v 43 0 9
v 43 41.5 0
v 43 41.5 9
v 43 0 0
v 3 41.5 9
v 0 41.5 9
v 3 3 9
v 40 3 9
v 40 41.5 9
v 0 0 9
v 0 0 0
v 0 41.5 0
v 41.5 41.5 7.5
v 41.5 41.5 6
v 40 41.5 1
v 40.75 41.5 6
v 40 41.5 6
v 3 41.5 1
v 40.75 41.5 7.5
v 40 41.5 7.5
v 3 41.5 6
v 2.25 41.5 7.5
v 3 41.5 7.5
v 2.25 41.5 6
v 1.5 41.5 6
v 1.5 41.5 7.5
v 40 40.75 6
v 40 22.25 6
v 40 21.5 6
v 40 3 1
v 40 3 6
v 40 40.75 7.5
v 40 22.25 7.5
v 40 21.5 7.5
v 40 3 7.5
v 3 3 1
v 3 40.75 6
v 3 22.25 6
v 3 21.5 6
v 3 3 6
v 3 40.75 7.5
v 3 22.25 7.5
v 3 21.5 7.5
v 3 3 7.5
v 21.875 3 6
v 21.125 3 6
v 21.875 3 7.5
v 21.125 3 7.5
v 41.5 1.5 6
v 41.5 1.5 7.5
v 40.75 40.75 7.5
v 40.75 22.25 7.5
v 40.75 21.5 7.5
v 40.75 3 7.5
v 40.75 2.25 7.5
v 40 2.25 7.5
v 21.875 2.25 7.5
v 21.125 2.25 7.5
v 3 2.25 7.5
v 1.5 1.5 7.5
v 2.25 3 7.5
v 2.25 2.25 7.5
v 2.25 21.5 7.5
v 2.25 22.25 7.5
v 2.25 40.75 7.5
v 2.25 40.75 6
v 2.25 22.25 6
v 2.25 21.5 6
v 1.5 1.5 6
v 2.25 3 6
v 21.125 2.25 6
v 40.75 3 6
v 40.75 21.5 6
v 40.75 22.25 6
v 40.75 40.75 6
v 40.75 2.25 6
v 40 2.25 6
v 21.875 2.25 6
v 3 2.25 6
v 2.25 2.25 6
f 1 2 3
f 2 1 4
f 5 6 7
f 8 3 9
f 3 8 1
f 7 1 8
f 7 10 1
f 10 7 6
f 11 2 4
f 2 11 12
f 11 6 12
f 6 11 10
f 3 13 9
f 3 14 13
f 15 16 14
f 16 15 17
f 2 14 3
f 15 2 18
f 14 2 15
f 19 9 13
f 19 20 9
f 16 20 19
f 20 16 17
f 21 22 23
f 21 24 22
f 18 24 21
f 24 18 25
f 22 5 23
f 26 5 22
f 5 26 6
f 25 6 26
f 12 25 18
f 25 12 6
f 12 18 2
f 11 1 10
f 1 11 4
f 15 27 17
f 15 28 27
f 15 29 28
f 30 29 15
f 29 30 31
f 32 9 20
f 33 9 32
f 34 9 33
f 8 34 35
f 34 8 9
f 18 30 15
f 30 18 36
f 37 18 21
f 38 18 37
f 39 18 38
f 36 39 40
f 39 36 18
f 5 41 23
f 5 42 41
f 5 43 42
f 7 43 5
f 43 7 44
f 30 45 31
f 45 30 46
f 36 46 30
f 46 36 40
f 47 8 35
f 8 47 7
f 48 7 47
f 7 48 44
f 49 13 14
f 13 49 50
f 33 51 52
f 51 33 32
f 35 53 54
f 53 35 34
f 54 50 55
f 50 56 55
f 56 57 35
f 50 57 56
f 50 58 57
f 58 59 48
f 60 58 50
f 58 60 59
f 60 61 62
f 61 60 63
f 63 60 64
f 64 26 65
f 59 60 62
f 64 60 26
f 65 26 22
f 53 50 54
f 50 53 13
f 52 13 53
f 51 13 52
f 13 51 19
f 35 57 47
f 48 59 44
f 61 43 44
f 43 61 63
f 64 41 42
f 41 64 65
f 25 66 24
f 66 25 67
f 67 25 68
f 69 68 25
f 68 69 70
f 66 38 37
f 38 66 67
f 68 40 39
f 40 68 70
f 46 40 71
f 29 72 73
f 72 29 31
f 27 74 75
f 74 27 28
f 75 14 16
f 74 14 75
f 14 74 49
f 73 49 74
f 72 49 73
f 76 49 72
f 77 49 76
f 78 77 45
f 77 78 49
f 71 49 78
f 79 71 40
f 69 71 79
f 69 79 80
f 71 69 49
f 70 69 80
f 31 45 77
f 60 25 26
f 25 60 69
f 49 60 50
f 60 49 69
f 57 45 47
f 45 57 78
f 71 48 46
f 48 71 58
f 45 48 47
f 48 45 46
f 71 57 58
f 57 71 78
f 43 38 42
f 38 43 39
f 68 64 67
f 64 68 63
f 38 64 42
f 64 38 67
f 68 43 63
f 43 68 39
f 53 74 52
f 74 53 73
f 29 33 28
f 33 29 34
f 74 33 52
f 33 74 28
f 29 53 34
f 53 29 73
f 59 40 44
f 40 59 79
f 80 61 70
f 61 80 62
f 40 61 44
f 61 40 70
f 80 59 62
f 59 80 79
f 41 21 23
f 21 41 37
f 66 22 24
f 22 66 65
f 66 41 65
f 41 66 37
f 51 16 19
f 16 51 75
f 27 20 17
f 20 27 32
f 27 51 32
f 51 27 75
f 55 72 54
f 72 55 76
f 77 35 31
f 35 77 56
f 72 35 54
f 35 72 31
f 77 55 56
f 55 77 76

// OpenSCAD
/* [PCB Parameters] */
// PCB Width
pcb_width=40;
// PCB Length (slides in this way)
pcb_length=40;
// PCB Thickness (groove size)
pcb_thickness=1.5; 
// Space between board and shield
pcb_space=5; // [1:20]
// Extra Supports
extra_supports=0; // [0:5]

/* [Shield Parameters] */
// Wall Thickness (
wall_thickness=3;  // [3:7]
// Bottom Thickness
bottom_thickness=1; // [1:7]
// PCB Groove Depth
inset=1.5; // [1,1.5,2]



/* [Hidden] */
// Below are not parameters

wall_thin=wall_thickness - inset;

shield_w = pcb_width + (2 * wall_thin);
shield_l = pcb_length + wall_thin;
shield_h = pcb_space + bottom_thickness + pcb_thickness + wall_thin; 

module shield() {
    cube([shield_w, shield_l, shield_h]);
}

module shield_cut() {
    w = pcb_width - (2*inset);
    l = pcb_length - inset + 0.01;
    h = shield_h - bottom_thickness + 0.01;   
    cube([w, l, h]); 
}

module pcb_cut() {
    cube([pcb_width, pcb_length+0.01, pcb_thickness]);
}

module support() { 
    cube([inset/2,inset/2,pcb_thickness]);
}

module supports() { 
    h = bottom_thickness + pcb_space;
    l1 = wall_thickness - (inset/2);
	l2 = pcb_length + (inset/2);
	w2 = pcb_width;
	
    translate([l1, l1, h]) { support(); }
    translate([l1, l2, h]) { support(); }
    translate([w2, l2, h]) { support(); }
    translate([w2, l1, h]) { support(); }
	
	wd = (w2 - l1);
	ld = (l2 - l1);
	
	for (s = [0 : extra_supports])
	{
		translate([s * (wd / (extra_supports+2)) + (wd / (extra_supports+2)) + l1, l1, h]) { support(); }
		translate([l1, s * (ld / (extra_supports+2)) + (ld / (extra_supports+2)) + l1, h]) { support(); }
		translate([w2, s * (ld / (extra_supports+2)) + (ld / (extra_supports+2)) + l1, h]) { support(); }
	}

}



module part_shield() {
    
	union() { 
		difference()
		{
			shield();
			
			translate([wall_thickness, wall_thickness, bottom_thickness]) {
				shield_cut();
			}
			
			translate([wall_thin, wall_thin, bottom_thickness+pcb_space]) {
				pcb_cut();
			}
		}
		color([1,0,0]) supports();
	}
}

part_shield();
